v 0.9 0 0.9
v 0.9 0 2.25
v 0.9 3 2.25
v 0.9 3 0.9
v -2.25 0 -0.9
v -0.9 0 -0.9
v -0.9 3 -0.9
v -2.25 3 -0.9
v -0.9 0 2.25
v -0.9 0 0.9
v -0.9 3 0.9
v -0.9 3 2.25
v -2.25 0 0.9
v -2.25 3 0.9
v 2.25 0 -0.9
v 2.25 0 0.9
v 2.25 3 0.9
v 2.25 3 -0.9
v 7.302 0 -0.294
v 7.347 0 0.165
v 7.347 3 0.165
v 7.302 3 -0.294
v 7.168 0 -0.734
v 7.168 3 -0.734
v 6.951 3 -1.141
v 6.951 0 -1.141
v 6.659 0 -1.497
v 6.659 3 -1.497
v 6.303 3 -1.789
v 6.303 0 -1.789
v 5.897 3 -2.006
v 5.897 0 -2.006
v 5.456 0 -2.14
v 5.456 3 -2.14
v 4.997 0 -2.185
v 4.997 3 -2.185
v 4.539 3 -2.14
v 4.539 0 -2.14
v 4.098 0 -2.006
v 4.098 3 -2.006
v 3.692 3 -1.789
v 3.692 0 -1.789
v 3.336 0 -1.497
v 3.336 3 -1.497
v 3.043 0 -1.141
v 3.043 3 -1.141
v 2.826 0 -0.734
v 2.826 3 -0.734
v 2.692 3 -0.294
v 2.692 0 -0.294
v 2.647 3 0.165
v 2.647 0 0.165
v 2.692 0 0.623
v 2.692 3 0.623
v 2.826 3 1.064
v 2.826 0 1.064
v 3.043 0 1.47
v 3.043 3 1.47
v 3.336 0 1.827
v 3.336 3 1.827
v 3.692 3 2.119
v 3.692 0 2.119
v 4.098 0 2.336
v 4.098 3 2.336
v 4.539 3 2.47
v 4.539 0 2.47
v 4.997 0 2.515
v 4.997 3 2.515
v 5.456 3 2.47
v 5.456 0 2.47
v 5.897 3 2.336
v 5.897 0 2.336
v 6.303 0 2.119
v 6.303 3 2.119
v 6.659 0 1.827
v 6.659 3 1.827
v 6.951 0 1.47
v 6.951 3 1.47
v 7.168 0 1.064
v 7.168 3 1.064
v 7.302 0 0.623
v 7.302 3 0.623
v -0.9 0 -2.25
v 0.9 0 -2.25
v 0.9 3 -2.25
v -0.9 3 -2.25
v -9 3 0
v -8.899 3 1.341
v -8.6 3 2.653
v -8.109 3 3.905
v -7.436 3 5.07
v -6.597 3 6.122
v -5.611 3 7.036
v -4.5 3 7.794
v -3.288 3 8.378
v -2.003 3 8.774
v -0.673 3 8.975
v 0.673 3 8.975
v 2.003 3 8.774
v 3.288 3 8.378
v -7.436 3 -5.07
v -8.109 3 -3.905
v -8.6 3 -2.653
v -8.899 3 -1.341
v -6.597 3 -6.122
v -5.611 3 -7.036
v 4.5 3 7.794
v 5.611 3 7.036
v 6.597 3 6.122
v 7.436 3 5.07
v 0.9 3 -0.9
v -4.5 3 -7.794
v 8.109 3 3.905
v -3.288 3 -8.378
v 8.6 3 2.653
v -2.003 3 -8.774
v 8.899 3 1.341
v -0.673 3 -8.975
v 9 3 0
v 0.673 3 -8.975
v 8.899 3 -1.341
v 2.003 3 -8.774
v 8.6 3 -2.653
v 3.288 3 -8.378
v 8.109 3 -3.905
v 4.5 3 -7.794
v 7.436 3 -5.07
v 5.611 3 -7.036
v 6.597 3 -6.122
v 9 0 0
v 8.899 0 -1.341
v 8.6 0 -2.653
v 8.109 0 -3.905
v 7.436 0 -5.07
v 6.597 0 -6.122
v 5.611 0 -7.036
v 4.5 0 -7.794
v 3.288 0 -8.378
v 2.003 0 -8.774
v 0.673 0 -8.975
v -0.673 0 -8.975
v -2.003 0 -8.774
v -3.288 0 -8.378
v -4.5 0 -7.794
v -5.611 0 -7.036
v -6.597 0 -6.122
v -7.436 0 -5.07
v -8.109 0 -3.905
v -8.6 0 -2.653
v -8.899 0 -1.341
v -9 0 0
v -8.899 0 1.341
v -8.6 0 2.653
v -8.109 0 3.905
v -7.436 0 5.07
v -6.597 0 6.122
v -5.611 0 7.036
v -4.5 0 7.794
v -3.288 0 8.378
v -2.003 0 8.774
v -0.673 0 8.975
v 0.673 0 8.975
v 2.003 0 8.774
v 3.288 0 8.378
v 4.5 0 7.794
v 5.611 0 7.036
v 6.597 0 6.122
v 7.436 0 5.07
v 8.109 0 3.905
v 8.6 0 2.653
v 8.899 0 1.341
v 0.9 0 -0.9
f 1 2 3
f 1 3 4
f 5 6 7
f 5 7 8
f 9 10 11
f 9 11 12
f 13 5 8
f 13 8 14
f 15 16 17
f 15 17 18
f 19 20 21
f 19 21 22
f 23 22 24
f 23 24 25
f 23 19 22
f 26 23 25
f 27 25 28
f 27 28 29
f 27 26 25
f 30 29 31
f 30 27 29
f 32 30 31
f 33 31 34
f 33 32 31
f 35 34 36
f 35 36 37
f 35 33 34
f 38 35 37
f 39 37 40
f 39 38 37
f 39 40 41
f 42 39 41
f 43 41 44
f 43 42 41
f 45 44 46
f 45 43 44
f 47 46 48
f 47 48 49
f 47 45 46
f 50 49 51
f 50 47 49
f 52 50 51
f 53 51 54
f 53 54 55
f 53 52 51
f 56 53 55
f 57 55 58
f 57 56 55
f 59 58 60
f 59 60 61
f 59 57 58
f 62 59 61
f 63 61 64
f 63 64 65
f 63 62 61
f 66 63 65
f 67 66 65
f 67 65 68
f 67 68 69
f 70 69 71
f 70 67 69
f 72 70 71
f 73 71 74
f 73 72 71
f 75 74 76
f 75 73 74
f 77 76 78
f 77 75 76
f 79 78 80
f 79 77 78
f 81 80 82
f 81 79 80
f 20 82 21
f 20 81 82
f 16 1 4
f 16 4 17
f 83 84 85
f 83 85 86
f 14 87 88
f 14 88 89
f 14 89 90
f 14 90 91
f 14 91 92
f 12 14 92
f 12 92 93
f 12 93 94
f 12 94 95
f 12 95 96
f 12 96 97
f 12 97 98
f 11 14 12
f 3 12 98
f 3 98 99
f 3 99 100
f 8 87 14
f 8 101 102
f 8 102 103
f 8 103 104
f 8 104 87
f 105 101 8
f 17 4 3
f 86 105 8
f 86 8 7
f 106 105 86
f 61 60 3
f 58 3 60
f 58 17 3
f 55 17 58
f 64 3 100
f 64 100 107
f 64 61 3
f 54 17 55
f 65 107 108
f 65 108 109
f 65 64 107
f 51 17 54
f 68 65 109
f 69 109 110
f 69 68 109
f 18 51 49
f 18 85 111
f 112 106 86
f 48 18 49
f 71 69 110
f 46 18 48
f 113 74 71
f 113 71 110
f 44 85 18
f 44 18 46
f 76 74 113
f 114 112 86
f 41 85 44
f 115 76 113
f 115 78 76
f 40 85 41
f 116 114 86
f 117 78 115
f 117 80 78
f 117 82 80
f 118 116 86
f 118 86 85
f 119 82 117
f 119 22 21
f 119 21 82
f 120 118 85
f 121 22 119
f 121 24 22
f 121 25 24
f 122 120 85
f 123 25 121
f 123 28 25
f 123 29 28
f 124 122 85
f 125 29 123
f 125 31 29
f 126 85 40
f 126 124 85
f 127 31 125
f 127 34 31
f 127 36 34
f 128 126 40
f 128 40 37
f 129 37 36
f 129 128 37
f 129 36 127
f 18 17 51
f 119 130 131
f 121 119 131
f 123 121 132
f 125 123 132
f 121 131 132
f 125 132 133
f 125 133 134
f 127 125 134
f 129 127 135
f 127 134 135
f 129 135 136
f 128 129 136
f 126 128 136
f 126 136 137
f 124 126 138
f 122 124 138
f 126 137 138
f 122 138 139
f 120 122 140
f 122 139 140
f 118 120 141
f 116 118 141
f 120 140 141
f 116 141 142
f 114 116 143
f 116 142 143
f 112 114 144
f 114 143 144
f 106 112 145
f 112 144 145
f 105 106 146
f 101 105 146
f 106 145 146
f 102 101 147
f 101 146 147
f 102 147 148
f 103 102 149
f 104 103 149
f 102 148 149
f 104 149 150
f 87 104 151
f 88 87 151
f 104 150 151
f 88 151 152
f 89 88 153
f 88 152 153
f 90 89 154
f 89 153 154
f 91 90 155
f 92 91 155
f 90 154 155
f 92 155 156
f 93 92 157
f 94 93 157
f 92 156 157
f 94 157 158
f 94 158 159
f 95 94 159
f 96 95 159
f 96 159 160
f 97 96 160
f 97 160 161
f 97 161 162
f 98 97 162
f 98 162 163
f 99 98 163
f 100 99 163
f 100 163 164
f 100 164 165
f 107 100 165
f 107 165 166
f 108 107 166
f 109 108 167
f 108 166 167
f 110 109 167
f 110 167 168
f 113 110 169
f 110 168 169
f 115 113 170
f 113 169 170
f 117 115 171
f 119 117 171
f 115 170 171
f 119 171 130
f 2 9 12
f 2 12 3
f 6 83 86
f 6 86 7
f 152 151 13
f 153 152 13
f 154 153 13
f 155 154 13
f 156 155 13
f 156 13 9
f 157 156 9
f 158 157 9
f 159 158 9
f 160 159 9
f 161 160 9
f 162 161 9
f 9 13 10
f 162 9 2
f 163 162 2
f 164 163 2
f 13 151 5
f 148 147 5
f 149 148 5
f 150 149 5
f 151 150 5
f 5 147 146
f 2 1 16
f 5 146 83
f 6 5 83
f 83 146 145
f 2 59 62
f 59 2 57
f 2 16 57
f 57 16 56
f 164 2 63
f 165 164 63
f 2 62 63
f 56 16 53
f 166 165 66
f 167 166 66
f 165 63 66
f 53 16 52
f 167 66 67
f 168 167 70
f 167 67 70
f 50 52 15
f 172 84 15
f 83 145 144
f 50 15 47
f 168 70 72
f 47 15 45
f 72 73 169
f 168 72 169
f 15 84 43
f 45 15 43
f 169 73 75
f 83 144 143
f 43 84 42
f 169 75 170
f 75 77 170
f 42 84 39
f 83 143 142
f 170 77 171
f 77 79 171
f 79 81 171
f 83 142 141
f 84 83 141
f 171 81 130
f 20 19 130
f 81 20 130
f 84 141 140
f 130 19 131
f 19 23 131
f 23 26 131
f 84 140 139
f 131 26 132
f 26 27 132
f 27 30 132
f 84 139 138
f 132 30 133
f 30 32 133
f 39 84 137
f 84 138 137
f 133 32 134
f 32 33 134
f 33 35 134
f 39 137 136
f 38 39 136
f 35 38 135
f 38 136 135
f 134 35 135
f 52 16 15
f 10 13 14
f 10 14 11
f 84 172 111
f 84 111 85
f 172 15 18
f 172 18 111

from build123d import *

# Parameters (mm, degrees)
SKETCH1_R           = 9
SKETCH1_R_2         = 2.35
BOSS_EXTRUDE1_DEPTH = 3


with BuildPart() as part:
    # Sketch1 → Boss-Extrude1 (new body)
    with BuildSketch(Plane(origin=(0, 0, 0), x_dir=(1, 0, 0), z_dir=(0, 1, 0))):
        Circle(SKETCH1_R)
        with Locations((4.997281989, -0.164841493)):
            Circle(SKETCH1_R_2, mode=Mode.SUBTRACT)
        Polygon((-2.25, 0.9), (-2.25, -0.9), (-0.9, -0.9), (-0.9, -2.25), (0.9, -2.25), (0.9, -0.9), (2.25, -0.9), (2.25, 0.9), (0.9, 0.9), (0.9, 2.25), (-0.9, 2.25), (-0.9, 0.9), align=None, mode=Mode.SUBTRACT)
    extrude(amount=BOSS_EXTRUDE1_DEPTH)


solid = part.part
